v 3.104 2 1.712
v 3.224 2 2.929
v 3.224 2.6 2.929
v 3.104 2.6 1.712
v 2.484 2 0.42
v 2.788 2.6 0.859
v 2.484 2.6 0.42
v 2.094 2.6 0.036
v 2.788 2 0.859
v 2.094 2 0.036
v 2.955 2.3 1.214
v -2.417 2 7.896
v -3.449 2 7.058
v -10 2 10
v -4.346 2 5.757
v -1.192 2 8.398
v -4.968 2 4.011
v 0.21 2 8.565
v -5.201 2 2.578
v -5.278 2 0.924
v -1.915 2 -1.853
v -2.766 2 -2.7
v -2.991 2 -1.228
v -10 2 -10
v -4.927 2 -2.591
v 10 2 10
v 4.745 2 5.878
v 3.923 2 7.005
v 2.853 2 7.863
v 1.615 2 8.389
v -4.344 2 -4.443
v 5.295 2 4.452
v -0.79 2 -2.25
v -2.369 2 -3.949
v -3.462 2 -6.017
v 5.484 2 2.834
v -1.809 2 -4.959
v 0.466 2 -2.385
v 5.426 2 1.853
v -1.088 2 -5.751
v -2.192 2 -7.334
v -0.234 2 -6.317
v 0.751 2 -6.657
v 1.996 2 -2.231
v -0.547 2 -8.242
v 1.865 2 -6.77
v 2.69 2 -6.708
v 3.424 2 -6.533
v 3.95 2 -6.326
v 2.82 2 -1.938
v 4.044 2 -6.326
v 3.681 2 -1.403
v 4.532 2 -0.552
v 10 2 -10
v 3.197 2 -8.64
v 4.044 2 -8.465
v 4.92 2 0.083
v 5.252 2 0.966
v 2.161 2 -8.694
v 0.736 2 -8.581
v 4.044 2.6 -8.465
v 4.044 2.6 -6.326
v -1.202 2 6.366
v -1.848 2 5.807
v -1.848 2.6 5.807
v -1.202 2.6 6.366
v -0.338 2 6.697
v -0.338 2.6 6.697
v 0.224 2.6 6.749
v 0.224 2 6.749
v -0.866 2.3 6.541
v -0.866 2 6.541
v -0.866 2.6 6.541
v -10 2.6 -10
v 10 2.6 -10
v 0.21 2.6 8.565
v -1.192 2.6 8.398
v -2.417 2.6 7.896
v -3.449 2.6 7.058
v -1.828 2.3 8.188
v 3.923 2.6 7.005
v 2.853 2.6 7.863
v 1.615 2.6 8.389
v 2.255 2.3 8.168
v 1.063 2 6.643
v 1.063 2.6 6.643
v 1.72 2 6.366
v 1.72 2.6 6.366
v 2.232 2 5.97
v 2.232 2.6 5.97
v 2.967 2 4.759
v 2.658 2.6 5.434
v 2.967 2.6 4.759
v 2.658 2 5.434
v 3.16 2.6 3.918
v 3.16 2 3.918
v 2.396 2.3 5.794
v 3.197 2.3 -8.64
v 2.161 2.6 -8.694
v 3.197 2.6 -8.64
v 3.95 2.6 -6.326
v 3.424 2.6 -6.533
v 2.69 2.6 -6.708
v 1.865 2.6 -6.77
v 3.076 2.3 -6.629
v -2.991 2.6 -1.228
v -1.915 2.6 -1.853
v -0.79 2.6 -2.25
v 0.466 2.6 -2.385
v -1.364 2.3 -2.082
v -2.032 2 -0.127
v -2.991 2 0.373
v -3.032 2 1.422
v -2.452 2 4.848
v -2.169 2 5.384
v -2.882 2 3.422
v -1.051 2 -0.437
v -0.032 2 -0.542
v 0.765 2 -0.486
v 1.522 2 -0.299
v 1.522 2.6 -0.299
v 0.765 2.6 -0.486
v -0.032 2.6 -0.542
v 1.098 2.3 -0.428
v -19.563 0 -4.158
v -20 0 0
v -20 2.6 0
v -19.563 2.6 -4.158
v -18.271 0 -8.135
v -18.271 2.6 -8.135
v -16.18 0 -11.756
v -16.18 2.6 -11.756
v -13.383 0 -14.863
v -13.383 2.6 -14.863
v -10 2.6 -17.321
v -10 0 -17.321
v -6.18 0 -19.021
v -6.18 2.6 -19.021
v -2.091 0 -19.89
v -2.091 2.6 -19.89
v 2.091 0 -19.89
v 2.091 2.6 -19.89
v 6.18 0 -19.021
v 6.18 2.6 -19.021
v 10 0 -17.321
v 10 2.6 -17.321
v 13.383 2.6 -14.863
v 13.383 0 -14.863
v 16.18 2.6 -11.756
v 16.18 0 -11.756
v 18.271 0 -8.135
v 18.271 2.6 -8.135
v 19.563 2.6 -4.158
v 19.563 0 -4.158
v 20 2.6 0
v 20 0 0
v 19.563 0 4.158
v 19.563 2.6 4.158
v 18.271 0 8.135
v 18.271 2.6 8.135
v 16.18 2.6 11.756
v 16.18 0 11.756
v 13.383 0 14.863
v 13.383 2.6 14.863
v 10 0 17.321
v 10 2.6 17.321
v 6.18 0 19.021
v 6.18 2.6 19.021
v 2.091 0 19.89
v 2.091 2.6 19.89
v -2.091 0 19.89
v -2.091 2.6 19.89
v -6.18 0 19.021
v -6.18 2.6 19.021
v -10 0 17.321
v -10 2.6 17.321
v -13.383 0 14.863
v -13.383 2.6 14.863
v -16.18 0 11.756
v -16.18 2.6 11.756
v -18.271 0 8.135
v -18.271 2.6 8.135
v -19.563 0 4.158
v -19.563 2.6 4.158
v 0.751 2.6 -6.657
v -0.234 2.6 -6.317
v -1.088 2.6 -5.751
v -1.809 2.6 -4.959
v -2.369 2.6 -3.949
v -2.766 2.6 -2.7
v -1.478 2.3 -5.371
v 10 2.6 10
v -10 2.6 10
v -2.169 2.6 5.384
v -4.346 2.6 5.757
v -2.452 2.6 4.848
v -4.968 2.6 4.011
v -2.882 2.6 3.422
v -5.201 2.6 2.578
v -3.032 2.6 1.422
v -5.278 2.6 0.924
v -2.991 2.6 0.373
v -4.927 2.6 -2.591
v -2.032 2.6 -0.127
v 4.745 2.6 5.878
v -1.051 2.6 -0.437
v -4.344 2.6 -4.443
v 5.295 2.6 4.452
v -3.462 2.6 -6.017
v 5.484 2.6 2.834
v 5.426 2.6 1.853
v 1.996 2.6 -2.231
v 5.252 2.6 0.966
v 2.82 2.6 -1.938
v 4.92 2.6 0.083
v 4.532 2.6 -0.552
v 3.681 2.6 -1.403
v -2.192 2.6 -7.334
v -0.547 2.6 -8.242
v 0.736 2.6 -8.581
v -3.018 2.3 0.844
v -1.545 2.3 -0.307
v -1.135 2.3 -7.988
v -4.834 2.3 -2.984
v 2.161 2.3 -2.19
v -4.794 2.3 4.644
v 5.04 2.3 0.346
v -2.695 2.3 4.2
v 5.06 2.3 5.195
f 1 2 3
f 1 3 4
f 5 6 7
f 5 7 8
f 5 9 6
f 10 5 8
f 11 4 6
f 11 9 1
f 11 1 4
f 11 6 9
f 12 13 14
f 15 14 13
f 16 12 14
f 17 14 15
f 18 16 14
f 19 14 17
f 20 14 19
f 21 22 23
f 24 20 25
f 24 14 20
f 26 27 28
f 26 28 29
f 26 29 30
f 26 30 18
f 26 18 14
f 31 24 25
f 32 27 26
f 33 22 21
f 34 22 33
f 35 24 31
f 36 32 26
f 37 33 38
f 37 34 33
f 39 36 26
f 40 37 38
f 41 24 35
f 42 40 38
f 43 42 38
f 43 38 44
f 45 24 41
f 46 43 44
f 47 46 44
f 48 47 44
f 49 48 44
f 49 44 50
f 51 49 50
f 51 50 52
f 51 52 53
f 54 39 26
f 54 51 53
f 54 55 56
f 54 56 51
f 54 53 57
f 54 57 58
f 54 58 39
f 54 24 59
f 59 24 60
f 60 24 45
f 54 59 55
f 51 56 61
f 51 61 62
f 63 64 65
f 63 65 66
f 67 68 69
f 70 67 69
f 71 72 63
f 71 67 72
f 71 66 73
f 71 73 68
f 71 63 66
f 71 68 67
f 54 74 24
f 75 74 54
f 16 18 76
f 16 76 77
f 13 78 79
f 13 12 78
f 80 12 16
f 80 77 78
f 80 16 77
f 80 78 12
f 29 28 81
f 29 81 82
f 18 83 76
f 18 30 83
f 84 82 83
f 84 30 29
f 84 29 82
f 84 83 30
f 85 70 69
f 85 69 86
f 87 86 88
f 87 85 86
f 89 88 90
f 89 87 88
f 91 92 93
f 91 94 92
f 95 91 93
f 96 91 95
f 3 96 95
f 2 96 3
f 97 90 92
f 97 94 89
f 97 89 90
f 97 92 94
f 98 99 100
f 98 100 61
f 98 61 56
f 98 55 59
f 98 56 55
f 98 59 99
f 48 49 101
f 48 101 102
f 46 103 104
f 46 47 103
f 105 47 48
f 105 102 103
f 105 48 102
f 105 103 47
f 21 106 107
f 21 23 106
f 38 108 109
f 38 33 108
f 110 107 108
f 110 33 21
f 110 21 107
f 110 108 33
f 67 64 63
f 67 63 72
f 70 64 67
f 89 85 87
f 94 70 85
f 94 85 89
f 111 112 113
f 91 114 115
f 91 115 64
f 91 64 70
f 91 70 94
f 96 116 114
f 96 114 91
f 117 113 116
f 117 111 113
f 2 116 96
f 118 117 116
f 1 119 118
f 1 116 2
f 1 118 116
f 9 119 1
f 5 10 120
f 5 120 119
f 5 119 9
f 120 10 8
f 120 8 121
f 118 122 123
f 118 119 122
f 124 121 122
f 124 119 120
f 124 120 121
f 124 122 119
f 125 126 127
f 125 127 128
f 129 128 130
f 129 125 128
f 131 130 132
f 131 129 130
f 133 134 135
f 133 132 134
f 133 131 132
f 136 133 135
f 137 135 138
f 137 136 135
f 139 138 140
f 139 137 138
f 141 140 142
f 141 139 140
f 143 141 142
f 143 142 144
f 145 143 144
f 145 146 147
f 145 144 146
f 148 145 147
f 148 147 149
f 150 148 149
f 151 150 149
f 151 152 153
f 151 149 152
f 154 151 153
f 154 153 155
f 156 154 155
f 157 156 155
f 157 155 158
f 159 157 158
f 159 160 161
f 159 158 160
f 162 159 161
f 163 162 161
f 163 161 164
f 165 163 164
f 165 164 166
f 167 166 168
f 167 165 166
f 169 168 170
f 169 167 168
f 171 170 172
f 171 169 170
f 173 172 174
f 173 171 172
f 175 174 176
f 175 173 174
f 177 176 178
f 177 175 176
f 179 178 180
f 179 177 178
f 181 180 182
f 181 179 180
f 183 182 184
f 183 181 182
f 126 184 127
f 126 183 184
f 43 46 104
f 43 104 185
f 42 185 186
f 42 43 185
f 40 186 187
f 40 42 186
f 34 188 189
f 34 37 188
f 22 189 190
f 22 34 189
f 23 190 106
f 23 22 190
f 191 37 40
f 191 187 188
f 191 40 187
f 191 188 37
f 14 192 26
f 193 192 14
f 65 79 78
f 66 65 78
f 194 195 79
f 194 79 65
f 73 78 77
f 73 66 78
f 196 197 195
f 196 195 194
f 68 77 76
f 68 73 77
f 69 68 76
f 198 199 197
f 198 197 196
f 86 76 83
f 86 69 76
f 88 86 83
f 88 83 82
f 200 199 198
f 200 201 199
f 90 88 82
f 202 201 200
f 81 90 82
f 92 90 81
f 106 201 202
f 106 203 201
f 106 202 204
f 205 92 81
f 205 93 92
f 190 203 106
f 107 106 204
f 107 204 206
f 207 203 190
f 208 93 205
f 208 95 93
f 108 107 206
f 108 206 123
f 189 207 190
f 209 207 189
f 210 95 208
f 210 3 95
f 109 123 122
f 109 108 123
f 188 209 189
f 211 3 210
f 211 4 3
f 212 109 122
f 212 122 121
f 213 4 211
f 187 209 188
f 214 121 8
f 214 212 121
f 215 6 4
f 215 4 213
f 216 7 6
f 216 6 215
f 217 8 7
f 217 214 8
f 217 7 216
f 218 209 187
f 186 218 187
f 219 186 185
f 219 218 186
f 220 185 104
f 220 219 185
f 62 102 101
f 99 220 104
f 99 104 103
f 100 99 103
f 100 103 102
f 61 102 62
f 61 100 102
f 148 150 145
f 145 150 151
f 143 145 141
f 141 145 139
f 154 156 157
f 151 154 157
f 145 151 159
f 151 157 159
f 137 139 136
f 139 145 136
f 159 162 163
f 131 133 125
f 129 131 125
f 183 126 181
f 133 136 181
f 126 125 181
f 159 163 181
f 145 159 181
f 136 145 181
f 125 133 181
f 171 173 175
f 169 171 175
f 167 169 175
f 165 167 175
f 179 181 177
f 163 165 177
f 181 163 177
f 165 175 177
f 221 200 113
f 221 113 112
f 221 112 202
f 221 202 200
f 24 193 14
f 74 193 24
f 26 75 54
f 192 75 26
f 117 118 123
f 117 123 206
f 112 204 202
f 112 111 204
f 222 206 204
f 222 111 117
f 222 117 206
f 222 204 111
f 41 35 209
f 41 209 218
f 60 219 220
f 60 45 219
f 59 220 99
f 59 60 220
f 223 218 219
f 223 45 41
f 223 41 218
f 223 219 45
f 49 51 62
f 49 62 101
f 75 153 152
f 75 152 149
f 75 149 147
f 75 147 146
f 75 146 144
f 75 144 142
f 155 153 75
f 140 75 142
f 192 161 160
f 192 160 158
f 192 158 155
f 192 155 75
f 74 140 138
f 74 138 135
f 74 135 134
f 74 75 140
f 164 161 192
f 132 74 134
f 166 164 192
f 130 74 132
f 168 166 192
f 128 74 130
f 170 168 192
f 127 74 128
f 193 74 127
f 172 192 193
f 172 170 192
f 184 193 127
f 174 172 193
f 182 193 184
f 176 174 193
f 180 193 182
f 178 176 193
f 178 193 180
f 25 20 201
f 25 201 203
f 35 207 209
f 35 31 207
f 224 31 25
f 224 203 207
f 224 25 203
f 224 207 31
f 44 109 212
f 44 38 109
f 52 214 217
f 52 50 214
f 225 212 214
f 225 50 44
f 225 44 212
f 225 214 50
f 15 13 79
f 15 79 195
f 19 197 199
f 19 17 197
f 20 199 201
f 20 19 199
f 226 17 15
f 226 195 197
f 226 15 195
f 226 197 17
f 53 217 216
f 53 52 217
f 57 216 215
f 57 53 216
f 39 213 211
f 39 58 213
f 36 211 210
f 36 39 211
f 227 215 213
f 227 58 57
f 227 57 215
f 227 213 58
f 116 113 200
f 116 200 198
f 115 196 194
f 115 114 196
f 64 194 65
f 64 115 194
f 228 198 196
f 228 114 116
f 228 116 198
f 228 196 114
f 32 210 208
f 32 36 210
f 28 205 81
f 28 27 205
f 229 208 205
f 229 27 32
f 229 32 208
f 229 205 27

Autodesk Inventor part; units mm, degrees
ref_plane "YZ Plane" through (0, 0, 0) normal (1, 0, 0) x (0, 1, 0)
ref_plane "XZ Plane" through (0, 0, 0) normal (0, 1, 0) x (-1, 0, 0)
ref_plane "XY Plane" through (0, 0, 0) normal (0, 0, 1) x (1, 0, 0)
sketch "Sketch1" plane through (0, 0, 0) normal (0, 1, 0) x (-1, 0, 0)
  circle A0 centre (0, 0) radius 20
  dimension "d0" = 40
extrude "Extrusion1" add sketch "Sketch1" along normal blind 2.6
sketch "Sketch2" plane through (0, 2.6, 0) normal (0, 1, 0) x (1, 0, 0)
  line L0 (10, -10) -> (-10, -10)
  line L1 (-10, -10) -> (-10, 10)
  line L2 (-10, 10) -> (10, 10)
  line L3 (10, 10) -> (10, -10)
  line L4 (10, -10) -> (-10, 10) construction
  line L5 (-10, -10) -> (10, 10) construction
  point P0 (0, 0)
  dimension "d3" = 20
  dimension "d4" = 20
extrude "Extrusion2" cut sketch "Sketch2" against normal blind 0.6
sketch "Sketch4" plane through (0, 2, 0) normal (0, 1, 0) x (1, 0, 0)
  line L0 (-6.2199, 8.694) -> (6.2369, 8.694) construction
  line L1 (6.2369, 8.694) -> (6.2369, -8.5651) construction
  line L2 (6.2369, -8.5651) -> (-6.2199, -8.5651) construction
  line L3 (-6.2199, -8.5651) -> (-6.2199, 8.694) construction
  spline S0 degree 2 poles (5.4835, -2.8345) (5.4835, -4.1124) (4.6361, -6.2782) (3.9231, -7.0047) knots 0 0 0 1 2 2 2
  spline S1 degree 2 poles (3.9231, -7.0047) (3.1832, -7.7714) (1.3268, -8.5651) (0.2103, -8.5651) knots 0 0 0 1 2 2 2
  spline S2 degree 2 poles (0.2103, -8.5651) (-0.9062, -8.5651) (-2.7492, -7.8118) (-3.4487, -7.0585) knots 0 0 0 1 2 2 2
  spline S3 degree 2 poles (-3.4487, -7.0585) (-4.3096, -6.1572) (-5.2782, -3.1304) (-5.2782, -0.9243) knots 0 0 0 1 2 2 2
  spline S4 degree 2 poles (-5.2782, -0.9243) (-5.2782, 1.2415) (-4.3904, 4.7256) (-3.4622, 6.0171) knots 0 0 0 1 2 2 2
  spline S5 degree 2 poles (-3.4622, 6.0171) (-2.5609, 7.2816) (0.291, 8.694) (2.1609, 8.694) knots 0 0 0 1 2 2 2
  spline S6 degree 2 poles (2.1609, 8.694) (2.7124, 8.694) (3.681, 8.5864) (4.0442, 8.4654) knots 0 0 0 1 2 2 2
  line L4 (4.0442, 8.4654) -> (4.0442, 6.3265)
  line L5 (4.0442, 6.3265) -> (3.95, 6.3265)
  spline S7 degree 2 poles (3.95, 6.3265) (3.6406, 6.4879) (2.5106, 6.7704) (1.8649, 6.7704) knots 0 0 0 1 2 2 2
  spline S8 degree 2 poles (1.8649, 6.7704) (-0.2067, 6.7704) (-2.7492, 3.9723) (-2.9913, 1.2281) knots 0 0 0 1 2 2 2
  spline S9 degree 2 poles (-2.9913, 1.2281) (-2.1977, 1.7796) (-0.5296, 2.385) (0.4659, 2.385) knots 0 0 0 1 2 2 2
  spline S10 degree 2 poles (0.4659, 2.385) (1.4344, 2.385) (2.8873, 1.9949) (3.681, 1.403) knots 0 0 0 1 2 2 2
  spline S11 degree 2 poles (3.681, 1.403) (4.5957, 0.7169) (5.4835, -1.4085) (5.4835, -2.8345) knots 0 0 0 1 2 2 2
  spline S12 degree 2 poles (3.2236, -2.9286) (3.2236, -1.9063) (2.6855, -0.5207) (2.0936, -0.0364) knots 0 0 0 1 2 2 2
  spline S13 degree 2 poles (2.0936, -0.0364) (1.6497, 0.3133) (0.5466, 0.542) (-0.0319, 0.542) knots 0 0 0 1 2 2 2
  spline S14 degree 2 poles (-0.0319, 0.542) (-0.8121, 0.542) (-2.2784, 0.0712) (-2.9913, -0.3727) knots 0 0 0 1 2 2 2
  spline S15 degree 2 poles (-2.9913, -0.3727) (-3.0048, -0.6149) (-3.0317, -1.0722) (-3.0317, -1.422) knots 0 0 0 1 2 2 2
  spline S16 degree 2 poles (-3.0317, -1.422) (-3.0317, -3.1439) (-2.3591, -5.2559) (-1.8479, -5.8074) knots 0 0 0 1 2 2 2
  spline S17 degree 2 poles (-1.8479, -5.8074) (-1.3771, -6.332) (-0.3547, -6.7491) (0.2237, -6.7491) knots 0 0 0 1 2 2 2
  spline S18 degree 2 poles (0.2237, -6.7491) (1.569, -6.7491) (3.2236, -4.8389) (3.2236, -2.9286) knots 0 0 0 1 2 2 2
  point P0 (0, 0)
extrude "Extrusion4" add sketch "Sketch4" along normal blind 0.6
properties part number "TopMarker1"
